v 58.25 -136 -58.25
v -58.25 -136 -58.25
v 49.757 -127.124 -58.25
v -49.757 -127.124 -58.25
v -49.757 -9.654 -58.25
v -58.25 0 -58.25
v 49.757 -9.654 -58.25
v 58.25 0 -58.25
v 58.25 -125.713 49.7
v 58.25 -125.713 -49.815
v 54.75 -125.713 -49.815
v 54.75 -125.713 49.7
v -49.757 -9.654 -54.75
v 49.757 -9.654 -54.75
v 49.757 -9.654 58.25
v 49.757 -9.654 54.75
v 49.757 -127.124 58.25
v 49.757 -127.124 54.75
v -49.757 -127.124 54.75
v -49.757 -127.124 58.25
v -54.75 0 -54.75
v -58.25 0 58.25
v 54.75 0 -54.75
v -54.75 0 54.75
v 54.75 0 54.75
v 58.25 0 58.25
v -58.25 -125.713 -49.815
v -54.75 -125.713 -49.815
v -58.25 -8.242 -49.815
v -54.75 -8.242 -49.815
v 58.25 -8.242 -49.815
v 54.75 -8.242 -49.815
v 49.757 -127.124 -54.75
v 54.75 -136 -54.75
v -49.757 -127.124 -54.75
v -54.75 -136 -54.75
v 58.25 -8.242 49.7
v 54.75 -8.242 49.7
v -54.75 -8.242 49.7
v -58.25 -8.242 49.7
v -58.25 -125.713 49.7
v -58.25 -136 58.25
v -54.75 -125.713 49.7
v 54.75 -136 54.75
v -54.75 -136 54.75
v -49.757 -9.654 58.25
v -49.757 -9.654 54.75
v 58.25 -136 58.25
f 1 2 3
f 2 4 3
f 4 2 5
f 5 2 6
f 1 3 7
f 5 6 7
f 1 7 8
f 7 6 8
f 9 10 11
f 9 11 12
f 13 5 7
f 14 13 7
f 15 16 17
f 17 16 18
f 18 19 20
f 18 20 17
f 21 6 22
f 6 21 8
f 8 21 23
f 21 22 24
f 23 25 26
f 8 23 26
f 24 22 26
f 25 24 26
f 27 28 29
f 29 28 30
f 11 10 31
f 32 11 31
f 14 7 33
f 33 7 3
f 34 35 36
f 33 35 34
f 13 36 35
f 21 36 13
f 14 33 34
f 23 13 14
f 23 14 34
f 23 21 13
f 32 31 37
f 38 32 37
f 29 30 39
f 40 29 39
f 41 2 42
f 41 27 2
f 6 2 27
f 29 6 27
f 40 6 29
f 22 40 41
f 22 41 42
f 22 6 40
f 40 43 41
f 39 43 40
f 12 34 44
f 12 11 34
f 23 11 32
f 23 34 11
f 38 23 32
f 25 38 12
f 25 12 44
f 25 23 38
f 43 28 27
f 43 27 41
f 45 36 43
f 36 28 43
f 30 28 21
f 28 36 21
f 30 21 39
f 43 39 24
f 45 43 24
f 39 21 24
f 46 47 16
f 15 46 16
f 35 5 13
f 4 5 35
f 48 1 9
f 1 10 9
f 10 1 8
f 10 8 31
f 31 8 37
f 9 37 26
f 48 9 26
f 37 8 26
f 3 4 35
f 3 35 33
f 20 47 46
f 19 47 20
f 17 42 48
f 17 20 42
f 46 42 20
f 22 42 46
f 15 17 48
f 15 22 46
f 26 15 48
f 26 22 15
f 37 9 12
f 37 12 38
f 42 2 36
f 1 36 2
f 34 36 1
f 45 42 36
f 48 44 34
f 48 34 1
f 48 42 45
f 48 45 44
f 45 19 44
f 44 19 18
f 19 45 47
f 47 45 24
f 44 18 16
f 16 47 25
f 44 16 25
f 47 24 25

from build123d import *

# Parameters (mm, degrees)
F0_W     = 116.5
F0_H     = 116.5
F0_W_2   = 109.5
F0_H_2   = 109.5
F1_DEPTH = 136
F2_W     = 99.5149090886
F2_H     = 117.4702011049
F3_DEPTH = 186
F4_W     = 117.4702011049
F4_H     = 99.5149090886
F5_DEPTH = 134.2


# Not quite as in the source:
# - a feature of the source that left no trace in its solid (it failed there, or was rolled back) is left out


with BuildPart() as f1:
    # F0 (on Front) → F1 (new body)
    with BuildSketch(Plane.XZ):
        Rectangle(F0_W, F0_H)
        Rectangle(F0_W_2, F0_H_2, mode=Mode.SUBTRACT)
    extrude(amount=F1_DEPTH)

    # F2 (on face) → F3 (cut)
    with BuildSketch(Plane(origin=(0, 0, -58.25), x_dir=(1, 0, 0), z_dir=(0, 0, -1))):
        with Locations((0, 68.3887079358)):
            Rectangle(F2_W, F2_H)
    extrude(amount=-F3_DEPTH, mode=Mode.SUBTRACT)

    # F4 (on face) → F5 (cut)
    with BuildSketch(Plane.YZ.offset(58.25)):
        with Locations((-66.9774990529, -0.0578425825)):
            Rectangle(F4_W, F4_H)
    extrude(amount=-F5_DEPTH, mode=Mode.SUBTRACT)


solid = f1.part
